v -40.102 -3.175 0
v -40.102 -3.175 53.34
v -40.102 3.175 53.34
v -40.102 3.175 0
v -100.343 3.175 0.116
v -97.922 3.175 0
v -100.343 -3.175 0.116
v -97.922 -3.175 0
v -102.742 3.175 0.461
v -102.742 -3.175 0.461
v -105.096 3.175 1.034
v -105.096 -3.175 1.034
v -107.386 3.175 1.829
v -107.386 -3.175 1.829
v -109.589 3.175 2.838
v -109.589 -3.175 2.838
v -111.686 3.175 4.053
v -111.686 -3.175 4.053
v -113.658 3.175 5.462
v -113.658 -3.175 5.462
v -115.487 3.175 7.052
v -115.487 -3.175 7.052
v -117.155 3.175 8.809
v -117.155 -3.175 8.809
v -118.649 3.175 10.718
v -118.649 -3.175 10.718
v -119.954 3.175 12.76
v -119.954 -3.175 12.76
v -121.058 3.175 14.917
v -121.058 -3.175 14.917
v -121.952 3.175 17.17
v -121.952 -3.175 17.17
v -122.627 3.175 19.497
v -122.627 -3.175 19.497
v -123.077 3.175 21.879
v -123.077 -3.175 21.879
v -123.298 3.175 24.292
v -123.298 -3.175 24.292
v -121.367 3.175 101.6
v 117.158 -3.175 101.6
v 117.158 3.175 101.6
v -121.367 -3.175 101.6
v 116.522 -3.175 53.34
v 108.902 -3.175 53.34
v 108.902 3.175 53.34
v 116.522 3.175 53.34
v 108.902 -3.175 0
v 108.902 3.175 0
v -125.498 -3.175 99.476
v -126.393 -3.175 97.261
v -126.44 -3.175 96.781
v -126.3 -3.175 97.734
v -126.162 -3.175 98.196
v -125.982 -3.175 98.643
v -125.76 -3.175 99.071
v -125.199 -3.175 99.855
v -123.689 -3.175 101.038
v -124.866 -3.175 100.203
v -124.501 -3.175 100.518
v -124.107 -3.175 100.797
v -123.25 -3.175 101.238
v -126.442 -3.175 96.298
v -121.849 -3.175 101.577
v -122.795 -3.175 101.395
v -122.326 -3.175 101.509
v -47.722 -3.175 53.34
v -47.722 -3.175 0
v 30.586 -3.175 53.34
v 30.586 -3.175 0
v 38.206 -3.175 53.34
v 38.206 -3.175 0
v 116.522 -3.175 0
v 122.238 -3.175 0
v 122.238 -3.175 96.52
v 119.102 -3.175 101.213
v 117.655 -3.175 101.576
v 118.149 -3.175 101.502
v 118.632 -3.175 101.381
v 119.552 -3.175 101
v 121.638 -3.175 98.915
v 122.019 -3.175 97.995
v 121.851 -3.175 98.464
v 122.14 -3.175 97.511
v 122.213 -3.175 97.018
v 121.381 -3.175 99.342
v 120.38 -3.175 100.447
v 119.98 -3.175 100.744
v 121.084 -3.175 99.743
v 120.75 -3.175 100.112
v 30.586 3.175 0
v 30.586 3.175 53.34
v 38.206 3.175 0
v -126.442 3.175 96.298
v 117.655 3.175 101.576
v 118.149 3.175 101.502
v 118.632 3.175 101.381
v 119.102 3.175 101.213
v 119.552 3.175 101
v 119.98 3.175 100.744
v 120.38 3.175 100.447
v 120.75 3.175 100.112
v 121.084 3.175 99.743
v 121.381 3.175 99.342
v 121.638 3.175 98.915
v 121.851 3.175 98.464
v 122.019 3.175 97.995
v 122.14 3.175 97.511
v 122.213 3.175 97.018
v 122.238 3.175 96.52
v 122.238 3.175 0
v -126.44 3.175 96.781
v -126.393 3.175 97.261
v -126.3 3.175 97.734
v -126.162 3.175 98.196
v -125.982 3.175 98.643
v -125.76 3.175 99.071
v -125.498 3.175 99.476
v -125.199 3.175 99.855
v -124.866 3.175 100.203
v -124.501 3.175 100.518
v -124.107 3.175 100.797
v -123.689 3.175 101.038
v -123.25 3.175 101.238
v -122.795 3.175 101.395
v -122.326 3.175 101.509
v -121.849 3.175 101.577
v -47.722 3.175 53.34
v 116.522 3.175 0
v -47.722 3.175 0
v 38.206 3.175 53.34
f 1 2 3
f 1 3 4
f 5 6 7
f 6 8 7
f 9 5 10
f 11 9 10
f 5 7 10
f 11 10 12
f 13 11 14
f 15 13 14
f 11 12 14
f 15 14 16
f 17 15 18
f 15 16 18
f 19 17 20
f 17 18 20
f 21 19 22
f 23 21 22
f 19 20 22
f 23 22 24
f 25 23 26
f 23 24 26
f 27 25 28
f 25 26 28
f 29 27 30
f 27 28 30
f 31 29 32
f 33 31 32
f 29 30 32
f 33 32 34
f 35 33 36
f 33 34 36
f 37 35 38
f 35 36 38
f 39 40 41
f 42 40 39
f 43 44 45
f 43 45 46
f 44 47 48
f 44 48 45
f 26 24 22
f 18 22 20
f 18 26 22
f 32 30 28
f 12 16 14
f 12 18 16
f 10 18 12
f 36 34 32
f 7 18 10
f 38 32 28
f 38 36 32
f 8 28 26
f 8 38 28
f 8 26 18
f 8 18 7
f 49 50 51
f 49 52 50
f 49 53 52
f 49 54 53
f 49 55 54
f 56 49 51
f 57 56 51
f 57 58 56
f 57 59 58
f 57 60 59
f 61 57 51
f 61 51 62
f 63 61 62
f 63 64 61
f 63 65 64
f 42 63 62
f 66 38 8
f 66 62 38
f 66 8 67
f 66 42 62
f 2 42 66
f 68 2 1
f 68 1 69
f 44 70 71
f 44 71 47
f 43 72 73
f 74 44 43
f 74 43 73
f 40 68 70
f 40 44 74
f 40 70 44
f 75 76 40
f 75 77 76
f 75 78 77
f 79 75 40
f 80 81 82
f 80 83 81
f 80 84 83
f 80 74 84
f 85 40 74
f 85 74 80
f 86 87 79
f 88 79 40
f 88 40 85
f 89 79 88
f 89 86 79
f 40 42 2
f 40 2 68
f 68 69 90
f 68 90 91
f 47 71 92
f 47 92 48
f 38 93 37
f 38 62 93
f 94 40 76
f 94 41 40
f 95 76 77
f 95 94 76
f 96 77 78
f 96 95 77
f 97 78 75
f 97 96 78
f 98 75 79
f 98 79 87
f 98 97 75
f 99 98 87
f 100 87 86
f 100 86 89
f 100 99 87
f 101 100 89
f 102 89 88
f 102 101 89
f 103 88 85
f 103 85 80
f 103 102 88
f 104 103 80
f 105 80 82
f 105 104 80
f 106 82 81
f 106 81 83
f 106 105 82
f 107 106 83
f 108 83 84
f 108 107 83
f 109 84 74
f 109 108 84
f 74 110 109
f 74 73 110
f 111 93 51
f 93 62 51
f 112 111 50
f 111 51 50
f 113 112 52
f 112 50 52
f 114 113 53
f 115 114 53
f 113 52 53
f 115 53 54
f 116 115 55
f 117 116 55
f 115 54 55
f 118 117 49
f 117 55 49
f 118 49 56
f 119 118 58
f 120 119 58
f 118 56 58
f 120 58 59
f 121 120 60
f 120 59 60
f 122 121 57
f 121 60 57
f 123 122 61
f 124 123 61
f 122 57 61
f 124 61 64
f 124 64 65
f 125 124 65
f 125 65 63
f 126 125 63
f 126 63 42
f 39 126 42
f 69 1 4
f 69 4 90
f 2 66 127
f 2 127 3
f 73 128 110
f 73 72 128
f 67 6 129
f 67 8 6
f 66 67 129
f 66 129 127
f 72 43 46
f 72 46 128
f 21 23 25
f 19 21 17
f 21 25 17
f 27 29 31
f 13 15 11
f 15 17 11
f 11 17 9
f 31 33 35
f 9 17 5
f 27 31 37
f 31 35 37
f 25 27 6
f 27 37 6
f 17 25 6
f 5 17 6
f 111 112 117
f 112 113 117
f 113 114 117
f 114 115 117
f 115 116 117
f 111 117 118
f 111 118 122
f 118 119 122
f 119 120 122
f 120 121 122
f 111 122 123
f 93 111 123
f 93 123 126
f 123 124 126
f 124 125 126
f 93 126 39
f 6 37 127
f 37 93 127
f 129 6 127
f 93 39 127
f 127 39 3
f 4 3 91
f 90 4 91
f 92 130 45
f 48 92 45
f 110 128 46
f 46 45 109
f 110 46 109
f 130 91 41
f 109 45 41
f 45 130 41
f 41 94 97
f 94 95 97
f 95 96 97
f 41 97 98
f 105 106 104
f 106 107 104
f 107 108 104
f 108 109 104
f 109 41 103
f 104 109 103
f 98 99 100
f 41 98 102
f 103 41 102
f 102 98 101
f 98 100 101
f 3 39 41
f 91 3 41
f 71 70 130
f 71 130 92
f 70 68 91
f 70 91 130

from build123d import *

# Parameters (mm, degrees)
F1_DEPTH = 3.175
F2_R     = 25.4
F3_R     = 5.08


with BuildPart() as f1:
    # F0 (on Front) → F1 (new body, symmetric)
    with BuildSketch(Plane.XZ):
        Polygon((122.2375, 101.6), (-126.673452, 101.6), (-122.2375, 0), (-47.722367, 0), (-47.722367, 53.34), (-40.102367, 53.34), (-40.102367, 0), (30.585833, 0), (30.585833, 53.34), (38.205833, 53.34), (38.205833, 0), (108.9025, 0), (108.9025, 53.34), (116.5225, 53.34), (116.5225, 0), (122.2375, 0), align=None)
    extrude(amount=F1_DEPTH, both=True)

    # F2
    f2_edges = [f1.edges().sort_by_distance(p)[0] for p in [
        (-122.2375, 0, 0),
    ]]
    fillet(f2_edges, radius=F2_R)

    # F3
    f3_edges = [f1.edges().sort_by_distance(p)[0] for p in [
        (-126.673452, 0, 101.6),
        (122.2375, 0, 101.6),
    ]]
    fillet(f3_edges, radius=F3_R)


solid = f1.part
